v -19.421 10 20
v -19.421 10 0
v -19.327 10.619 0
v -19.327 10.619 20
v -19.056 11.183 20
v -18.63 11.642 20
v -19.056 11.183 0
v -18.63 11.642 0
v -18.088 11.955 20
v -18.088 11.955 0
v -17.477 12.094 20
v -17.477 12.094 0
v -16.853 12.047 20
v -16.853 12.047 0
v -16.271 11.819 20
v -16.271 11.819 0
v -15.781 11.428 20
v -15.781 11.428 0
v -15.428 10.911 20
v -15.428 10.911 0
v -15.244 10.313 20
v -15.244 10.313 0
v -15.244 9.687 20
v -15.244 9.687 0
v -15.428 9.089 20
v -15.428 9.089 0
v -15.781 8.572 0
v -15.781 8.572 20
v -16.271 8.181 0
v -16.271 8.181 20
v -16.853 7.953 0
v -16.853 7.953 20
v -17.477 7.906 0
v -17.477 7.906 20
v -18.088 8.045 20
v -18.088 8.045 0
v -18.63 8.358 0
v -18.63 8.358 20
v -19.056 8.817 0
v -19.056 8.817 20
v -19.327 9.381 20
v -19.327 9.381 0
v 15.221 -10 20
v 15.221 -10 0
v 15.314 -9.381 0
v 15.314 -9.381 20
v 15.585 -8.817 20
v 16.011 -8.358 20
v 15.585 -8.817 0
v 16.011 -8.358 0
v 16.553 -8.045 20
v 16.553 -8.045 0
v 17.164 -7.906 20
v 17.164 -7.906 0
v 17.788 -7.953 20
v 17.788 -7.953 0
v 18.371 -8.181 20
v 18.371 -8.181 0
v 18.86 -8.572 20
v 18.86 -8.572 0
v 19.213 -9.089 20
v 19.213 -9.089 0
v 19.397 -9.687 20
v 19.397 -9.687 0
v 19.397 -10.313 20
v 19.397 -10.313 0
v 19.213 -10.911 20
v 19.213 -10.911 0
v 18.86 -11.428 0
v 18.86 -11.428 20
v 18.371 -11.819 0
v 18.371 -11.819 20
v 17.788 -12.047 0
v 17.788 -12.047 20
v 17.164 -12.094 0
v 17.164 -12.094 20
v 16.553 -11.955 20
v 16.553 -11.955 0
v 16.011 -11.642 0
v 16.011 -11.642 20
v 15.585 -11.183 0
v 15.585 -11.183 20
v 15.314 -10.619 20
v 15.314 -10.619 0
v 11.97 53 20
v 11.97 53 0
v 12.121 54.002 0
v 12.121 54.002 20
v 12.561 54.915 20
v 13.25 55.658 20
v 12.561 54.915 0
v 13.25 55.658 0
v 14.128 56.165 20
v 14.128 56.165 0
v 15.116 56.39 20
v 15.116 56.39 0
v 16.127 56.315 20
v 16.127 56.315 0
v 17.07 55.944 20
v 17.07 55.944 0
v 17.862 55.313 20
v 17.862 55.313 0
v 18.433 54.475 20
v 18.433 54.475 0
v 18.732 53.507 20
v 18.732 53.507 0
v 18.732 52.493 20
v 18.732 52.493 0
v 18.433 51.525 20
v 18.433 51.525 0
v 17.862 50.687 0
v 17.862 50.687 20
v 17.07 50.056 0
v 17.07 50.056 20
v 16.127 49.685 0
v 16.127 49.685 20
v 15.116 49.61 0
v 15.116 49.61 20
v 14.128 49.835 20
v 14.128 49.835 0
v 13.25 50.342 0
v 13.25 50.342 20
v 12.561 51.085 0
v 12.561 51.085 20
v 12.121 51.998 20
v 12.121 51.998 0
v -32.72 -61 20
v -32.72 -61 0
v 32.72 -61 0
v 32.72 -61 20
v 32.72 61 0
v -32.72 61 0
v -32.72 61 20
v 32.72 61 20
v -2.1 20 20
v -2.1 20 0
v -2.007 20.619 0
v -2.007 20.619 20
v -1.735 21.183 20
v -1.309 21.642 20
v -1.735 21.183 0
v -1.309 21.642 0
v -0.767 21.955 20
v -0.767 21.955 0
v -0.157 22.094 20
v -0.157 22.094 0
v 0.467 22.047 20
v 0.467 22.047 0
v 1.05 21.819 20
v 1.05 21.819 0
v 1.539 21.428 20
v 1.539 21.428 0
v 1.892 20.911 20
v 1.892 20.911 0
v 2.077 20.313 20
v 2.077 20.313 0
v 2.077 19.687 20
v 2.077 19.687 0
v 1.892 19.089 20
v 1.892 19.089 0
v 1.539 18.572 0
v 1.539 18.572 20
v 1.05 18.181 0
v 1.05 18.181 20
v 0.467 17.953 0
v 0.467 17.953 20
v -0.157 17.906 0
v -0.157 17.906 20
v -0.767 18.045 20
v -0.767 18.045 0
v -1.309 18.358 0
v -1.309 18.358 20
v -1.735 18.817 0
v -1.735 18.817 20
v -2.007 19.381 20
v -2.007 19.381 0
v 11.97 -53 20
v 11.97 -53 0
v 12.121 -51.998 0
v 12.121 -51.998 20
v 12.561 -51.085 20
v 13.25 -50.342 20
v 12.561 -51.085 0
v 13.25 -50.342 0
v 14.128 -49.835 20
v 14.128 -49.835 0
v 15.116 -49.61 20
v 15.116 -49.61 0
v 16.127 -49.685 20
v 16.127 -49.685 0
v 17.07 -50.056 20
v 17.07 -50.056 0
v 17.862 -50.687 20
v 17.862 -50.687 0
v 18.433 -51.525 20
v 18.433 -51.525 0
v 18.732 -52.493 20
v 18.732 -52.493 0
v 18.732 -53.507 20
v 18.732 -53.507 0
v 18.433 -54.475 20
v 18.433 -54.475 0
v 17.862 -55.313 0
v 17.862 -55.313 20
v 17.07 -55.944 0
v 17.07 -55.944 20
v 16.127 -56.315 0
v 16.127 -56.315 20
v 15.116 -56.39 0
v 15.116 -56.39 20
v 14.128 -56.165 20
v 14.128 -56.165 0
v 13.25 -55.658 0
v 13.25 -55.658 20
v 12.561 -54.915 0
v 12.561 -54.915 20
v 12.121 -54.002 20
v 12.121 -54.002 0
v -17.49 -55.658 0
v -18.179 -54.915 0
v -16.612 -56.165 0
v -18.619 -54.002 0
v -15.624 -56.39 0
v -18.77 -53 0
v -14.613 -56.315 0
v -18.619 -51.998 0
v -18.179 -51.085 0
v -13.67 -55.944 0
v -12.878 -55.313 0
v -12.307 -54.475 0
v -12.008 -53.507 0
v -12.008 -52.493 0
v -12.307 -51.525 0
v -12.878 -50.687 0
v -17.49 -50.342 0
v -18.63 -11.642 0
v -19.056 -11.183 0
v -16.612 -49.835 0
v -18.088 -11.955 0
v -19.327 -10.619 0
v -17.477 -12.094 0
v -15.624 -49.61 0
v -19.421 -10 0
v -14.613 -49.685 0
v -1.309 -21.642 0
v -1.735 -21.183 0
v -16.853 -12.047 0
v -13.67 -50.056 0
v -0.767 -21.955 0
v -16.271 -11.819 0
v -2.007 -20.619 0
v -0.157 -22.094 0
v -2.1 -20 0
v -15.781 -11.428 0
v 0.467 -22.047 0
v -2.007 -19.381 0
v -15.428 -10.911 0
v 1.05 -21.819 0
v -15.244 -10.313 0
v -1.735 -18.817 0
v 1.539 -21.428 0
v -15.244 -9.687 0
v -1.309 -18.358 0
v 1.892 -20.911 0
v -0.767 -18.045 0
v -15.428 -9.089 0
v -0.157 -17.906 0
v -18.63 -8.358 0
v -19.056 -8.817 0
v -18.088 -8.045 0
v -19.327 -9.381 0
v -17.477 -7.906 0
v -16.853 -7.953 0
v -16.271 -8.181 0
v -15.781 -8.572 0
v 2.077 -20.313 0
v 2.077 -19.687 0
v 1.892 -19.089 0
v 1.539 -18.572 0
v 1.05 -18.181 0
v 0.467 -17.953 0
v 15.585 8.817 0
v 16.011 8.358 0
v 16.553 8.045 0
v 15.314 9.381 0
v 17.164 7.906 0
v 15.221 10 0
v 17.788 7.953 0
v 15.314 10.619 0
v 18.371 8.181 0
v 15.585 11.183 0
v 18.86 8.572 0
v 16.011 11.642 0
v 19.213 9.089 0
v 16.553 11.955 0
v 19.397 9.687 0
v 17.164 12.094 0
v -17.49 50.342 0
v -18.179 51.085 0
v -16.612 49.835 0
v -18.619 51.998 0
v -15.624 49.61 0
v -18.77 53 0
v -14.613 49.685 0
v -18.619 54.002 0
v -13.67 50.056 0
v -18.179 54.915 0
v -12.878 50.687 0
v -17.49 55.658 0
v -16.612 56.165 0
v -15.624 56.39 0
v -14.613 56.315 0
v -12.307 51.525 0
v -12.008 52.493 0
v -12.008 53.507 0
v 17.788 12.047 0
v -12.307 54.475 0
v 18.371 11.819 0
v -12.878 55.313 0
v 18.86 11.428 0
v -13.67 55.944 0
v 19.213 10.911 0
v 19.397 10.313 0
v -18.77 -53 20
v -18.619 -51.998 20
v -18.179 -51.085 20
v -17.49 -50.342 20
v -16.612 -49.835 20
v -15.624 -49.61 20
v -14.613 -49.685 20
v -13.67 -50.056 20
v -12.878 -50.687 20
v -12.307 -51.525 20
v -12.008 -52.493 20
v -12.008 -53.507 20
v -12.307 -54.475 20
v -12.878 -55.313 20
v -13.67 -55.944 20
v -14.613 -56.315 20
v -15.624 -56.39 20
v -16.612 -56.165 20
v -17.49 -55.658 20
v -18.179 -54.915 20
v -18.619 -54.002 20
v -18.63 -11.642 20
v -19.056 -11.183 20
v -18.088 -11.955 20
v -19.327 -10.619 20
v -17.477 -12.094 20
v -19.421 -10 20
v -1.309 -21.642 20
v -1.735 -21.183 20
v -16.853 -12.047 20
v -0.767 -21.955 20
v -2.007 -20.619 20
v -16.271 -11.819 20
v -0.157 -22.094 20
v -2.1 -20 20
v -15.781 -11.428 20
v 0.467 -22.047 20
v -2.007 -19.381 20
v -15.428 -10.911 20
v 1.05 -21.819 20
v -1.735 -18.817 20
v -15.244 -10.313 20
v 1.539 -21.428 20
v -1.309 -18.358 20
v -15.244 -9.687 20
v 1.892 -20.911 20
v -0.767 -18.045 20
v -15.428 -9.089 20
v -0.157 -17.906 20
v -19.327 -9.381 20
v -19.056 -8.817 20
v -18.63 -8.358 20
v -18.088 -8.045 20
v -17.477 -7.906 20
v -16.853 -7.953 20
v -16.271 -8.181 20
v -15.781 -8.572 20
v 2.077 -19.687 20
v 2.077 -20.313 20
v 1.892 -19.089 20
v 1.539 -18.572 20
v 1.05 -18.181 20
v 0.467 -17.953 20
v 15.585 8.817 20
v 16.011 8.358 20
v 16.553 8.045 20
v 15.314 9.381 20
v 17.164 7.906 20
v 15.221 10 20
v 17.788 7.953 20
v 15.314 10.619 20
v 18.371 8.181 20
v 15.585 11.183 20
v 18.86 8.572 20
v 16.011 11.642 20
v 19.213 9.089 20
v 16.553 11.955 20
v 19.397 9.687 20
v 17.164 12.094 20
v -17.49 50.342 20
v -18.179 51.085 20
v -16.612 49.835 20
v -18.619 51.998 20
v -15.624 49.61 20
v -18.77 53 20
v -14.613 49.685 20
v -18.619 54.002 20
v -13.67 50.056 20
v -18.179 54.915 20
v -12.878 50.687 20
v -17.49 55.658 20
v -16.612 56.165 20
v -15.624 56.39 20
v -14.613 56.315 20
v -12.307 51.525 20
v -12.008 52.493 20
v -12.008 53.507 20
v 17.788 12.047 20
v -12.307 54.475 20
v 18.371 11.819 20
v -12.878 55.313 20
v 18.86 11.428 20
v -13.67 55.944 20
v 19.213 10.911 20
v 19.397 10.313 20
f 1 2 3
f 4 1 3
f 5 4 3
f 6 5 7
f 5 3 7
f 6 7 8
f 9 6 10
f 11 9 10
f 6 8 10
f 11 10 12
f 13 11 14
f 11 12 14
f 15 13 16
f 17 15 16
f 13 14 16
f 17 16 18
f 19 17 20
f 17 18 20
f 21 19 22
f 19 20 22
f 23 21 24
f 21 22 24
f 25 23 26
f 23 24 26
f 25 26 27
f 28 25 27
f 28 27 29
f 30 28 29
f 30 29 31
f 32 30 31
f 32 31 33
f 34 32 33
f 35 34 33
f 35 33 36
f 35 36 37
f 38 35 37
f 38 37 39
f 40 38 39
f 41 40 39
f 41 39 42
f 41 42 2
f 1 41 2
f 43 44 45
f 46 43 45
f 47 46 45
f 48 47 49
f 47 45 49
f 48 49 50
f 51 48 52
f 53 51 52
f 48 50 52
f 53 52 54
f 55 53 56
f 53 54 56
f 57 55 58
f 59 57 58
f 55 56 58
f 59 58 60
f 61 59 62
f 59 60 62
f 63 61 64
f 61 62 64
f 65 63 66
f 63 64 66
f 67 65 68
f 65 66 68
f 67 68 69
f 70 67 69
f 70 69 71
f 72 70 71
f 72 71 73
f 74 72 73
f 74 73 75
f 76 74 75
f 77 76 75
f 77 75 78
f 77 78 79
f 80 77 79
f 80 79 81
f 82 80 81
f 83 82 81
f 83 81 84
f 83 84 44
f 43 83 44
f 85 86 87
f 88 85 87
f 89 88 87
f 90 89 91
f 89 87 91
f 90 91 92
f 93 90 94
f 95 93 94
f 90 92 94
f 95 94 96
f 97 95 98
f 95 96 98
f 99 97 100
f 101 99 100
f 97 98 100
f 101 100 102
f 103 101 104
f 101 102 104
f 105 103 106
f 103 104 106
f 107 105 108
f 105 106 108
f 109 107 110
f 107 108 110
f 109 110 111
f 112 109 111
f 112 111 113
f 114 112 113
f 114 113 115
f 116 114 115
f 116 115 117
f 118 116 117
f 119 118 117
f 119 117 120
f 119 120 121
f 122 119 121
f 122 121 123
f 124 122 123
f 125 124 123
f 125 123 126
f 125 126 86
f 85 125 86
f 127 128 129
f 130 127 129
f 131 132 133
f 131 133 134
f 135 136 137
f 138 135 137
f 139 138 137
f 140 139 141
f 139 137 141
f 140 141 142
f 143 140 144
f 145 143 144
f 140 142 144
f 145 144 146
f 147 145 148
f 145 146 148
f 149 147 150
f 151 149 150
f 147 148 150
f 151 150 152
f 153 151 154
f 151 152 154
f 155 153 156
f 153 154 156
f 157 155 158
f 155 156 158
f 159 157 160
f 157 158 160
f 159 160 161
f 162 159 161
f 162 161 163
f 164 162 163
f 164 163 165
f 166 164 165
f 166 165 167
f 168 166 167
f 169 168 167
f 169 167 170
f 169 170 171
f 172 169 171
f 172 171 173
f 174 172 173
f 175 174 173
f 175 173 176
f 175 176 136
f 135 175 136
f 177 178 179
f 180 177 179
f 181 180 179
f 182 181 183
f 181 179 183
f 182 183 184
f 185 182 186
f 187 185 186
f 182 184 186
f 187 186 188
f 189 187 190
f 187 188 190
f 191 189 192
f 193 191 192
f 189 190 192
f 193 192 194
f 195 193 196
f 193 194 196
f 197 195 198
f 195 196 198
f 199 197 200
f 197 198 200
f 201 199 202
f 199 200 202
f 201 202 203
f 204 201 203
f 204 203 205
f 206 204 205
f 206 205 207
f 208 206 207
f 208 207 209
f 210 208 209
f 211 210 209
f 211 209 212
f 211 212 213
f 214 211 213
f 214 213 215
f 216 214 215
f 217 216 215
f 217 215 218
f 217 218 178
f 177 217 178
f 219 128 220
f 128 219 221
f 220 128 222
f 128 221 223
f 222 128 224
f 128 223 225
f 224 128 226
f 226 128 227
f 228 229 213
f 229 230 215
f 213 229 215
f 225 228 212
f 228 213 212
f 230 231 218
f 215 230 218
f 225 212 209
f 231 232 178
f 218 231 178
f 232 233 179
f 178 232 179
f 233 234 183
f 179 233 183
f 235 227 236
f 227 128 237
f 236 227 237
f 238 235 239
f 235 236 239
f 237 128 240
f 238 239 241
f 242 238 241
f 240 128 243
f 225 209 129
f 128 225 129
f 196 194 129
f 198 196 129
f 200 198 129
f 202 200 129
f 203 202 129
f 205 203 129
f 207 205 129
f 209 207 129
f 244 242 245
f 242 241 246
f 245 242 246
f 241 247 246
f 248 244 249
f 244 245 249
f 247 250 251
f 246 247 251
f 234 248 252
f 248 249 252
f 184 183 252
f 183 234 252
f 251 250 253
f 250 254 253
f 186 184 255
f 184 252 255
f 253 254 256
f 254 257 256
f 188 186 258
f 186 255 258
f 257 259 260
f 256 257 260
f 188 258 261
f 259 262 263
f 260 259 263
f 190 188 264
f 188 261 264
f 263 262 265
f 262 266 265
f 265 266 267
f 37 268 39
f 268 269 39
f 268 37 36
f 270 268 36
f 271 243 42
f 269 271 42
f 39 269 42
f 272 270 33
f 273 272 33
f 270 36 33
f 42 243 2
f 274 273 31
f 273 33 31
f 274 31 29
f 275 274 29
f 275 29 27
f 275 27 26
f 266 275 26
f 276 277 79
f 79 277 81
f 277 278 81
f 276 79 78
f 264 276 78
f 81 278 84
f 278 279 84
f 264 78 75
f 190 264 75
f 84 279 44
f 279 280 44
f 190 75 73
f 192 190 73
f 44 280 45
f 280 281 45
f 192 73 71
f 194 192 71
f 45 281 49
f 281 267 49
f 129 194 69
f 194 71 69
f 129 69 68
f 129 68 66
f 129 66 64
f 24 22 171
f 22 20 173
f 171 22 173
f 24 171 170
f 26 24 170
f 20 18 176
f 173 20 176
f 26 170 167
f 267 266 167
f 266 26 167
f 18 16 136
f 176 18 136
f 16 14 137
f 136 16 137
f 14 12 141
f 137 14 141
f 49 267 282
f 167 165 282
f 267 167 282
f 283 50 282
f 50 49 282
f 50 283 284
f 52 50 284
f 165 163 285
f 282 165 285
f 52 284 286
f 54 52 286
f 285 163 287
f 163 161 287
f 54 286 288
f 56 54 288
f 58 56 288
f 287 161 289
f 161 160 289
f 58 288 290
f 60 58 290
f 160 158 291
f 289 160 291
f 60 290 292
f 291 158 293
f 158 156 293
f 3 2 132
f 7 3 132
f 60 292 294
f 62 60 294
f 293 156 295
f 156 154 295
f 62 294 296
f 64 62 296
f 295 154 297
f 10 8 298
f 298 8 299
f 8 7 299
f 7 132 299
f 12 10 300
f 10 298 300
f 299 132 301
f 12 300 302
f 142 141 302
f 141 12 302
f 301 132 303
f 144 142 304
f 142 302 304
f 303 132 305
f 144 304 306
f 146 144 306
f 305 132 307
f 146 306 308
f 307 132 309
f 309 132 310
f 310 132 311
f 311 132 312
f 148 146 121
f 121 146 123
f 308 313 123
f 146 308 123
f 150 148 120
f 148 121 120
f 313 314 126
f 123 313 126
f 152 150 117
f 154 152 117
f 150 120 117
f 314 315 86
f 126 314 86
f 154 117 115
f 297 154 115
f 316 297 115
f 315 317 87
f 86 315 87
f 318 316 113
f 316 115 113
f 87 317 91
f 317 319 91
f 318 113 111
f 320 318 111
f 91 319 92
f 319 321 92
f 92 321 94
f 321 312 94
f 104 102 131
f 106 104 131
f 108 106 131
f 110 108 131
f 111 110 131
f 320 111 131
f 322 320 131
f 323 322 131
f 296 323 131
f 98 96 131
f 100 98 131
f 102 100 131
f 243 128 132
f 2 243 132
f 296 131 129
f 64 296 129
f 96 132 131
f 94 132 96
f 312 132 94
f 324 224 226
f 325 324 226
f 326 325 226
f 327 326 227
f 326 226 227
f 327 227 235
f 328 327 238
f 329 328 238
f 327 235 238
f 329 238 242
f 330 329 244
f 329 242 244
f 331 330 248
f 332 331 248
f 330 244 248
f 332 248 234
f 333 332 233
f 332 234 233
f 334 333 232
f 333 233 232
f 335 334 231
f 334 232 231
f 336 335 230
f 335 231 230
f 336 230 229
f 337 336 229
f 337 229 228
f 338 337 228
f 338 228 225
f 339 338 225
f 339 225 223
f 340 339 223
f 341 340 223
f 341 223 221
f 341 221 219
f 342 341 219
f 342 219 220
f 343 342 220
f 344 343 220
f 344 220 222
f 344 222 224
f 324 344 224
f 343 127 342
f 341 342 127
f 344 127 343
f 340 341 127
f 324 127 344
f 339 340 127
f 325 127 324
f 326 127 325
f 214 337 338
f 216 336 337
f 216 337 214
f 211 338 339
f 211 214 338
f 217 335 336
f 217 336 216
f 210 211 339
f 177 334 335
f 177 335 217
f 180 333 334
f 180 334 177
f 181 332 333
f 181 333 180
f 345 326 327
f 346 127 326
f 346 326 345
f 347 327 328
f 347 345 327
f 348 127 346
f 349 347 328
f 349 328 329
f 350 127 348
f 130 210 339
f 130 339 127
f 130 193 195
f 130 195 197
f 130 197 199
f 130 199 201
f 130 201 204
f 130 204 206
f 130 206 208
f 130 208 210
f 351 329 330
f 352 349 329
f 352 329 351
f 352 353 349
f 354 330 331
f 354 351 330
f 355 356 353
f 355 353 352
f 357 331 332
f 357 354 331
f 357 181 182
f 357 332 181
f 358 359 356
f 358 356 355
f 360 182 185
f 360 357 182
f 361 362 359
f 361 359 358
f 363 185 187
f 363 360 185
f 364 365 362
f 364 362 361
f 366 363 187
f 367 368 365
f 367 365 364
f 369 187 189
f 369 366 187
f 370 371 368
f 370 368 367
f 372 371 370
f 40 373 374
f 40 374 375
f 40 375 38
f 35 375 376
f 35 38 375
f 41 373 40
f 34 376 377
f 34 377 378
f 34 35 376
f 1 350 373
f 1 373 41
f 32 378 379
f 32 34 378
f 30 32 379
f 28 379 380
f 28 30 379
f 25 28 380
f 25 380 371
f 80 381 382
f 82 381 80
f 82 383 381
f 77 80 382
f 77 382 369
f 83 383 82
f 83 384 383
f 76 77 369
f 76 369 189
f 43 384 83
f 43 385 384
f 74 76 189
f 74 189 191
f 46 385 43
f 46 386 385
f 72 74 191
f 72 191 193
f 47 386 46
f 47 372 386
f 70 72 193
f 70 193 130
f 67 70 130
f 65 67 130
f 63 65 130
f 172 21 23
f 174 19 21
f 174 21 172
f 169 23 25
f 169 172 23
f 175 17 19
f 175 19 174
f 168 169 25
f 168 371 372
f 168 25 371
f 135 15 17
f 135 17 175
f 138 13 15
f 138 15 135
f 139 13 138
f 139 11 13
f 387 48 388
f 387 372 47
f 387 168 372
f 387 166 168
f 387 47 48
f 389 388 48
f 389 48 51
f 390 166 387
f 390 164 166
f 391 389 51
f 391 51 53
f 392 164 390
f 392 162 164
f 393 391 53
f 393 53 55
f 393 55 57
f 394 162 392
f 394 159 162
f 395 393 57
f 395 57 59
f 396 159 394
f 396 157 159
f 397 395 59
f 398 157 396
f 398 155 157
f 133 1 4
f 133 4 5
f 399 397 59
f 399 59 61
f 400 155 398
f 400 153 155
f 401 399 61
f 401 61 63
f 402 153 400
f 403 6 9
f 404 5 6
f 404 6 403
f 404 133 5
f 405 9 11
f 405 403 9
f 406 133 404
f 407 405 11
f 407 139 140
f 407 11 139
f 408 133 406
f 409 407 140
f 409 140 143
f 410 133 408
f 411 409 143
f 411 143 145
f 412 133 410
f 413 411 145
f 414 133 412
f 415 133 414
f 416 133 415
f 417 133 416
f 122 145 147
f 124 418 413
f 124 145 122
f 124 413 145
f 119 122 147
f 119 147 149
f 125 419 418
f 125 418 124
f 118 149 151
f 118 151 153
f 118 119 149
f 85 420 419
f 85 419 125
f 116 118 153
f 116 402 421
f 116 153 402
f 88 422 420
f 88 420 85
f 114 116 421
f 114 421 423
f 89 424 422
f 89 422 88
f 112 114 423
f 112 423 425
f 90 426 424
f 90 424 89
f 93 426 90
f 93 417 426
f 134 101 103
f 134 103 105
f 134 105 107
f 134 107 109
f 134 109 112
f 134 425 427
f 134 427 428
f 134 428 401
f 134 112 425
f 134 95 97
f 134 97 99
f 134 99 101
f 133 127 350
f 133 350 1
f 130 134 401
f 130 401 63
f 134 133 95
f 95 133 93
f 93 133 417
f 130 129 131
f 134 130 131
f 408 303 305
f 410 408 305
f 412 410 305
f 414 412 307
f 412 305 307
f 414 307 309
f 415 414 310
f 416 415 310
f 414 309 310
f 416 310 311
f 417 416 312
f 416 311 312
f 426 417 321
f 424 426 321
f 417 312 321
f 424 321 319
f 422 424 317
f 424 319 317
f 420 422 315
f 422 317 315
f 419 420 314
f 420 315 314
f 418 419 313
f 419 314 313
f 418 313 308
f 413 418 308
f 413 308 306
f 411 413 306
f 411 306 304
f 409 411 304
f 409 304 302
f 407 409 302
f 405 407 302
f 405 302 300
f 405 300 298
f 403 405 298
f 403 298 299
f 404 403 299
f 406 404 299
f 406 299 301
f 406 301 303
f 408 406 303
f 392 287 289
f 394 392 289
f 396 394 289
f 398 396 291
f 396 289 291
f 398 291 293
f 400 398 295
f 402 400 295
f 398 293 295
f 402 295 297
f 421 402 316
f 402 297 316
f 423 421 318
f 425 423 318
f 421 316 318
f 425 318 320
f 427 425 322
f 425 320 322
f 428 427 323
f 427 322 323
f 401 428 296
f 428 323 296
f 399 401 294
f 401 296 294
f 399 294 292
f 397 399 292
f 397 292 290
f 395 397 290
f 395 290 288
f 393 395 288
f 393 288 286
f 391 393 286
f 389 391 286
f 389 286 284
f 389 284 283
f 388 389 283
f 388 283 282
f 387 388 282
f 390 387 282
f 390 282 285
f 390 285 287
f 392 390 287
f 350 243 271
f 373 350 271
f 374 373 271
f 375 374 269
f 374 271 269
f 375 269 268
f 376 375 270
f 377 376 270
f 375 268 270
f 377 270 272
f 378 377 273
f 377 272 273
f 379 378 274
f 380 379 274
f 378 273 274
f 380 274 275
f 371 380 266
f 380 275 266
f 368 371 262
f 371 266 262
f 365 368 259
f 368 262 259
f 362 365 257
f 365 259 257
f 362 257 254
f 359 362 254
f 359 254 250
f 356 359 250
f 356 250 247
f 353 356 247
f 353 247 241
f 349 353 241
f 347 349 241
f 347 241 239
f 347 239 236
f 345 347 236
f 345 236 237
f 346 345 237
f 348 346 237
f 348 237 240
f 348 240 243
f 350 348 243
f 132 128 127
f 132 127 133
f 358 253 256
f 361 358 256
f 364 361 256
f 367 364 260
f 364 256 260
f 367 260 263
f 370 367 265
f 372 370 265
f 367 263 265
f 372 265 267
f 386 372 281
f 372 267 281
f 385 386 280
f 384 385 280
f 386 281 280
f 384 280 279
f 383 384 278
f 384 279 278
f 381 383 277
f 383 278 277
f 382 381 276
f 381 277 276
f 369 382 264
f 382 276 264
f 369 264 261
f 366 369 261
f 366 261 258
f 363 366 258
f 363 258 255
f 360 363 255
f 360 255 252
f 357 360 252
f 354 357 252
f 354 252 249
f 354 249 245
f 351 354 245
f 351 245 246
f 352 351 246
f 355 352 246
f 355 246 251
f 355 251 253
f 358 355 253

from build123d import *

# Parameters (mm, degrees)
SKETCH1_W                  = 65.44
SKETCH1_H                  = 122
BOSS_EXTRUDE1_DEPTH        = 20
M5X0_8_TAPPED_HOLE1_D      = 4.2
M5X0_8_TAPPED_HOLE1_DEPTH  = 20
M8X1_25_TAPPED_HOLE1_D     = 6.8
M8X1_25_TAPPED_HOLE1_DEPTH = 20


with BuildPart() as part:
    # Sketch1 → Boss-Extrude1 (new body)
    with BuildSketch(Plane.XY):
        Rectangle(SKETCH1_W, SKETCH1_H)
    extrude(amount=BOSS_EXTRUDE1_DEPTH)

    # M5x0.8 Tapped Hole1
    with Locations(Plane.XY.offset(20)):
        with Locations((0, 20), (-17.320508076, 10), (-17.320508076, -10), (0, -20), (17.320508076, -10), (17.320508076, 10)):
            Hole(M5X0_8_TAPPED_HOLE1_D / 2, depth=M5X0_8_TAPPED_HOLE1_DEPTH)

    # M8x1.25 Tapped Hole1
    with Locations(Plane.XY.offset(20)):
        with Locations((-15.37, 53), (15.37, 53), (15.37, -53), (-15.37, -53)):
            Hole(M8X1_25_TAPPED_HOLE1_D / 2, depth=M8X1_25_TAPPED_HOLE1_DEPTH)


solid = part.part
